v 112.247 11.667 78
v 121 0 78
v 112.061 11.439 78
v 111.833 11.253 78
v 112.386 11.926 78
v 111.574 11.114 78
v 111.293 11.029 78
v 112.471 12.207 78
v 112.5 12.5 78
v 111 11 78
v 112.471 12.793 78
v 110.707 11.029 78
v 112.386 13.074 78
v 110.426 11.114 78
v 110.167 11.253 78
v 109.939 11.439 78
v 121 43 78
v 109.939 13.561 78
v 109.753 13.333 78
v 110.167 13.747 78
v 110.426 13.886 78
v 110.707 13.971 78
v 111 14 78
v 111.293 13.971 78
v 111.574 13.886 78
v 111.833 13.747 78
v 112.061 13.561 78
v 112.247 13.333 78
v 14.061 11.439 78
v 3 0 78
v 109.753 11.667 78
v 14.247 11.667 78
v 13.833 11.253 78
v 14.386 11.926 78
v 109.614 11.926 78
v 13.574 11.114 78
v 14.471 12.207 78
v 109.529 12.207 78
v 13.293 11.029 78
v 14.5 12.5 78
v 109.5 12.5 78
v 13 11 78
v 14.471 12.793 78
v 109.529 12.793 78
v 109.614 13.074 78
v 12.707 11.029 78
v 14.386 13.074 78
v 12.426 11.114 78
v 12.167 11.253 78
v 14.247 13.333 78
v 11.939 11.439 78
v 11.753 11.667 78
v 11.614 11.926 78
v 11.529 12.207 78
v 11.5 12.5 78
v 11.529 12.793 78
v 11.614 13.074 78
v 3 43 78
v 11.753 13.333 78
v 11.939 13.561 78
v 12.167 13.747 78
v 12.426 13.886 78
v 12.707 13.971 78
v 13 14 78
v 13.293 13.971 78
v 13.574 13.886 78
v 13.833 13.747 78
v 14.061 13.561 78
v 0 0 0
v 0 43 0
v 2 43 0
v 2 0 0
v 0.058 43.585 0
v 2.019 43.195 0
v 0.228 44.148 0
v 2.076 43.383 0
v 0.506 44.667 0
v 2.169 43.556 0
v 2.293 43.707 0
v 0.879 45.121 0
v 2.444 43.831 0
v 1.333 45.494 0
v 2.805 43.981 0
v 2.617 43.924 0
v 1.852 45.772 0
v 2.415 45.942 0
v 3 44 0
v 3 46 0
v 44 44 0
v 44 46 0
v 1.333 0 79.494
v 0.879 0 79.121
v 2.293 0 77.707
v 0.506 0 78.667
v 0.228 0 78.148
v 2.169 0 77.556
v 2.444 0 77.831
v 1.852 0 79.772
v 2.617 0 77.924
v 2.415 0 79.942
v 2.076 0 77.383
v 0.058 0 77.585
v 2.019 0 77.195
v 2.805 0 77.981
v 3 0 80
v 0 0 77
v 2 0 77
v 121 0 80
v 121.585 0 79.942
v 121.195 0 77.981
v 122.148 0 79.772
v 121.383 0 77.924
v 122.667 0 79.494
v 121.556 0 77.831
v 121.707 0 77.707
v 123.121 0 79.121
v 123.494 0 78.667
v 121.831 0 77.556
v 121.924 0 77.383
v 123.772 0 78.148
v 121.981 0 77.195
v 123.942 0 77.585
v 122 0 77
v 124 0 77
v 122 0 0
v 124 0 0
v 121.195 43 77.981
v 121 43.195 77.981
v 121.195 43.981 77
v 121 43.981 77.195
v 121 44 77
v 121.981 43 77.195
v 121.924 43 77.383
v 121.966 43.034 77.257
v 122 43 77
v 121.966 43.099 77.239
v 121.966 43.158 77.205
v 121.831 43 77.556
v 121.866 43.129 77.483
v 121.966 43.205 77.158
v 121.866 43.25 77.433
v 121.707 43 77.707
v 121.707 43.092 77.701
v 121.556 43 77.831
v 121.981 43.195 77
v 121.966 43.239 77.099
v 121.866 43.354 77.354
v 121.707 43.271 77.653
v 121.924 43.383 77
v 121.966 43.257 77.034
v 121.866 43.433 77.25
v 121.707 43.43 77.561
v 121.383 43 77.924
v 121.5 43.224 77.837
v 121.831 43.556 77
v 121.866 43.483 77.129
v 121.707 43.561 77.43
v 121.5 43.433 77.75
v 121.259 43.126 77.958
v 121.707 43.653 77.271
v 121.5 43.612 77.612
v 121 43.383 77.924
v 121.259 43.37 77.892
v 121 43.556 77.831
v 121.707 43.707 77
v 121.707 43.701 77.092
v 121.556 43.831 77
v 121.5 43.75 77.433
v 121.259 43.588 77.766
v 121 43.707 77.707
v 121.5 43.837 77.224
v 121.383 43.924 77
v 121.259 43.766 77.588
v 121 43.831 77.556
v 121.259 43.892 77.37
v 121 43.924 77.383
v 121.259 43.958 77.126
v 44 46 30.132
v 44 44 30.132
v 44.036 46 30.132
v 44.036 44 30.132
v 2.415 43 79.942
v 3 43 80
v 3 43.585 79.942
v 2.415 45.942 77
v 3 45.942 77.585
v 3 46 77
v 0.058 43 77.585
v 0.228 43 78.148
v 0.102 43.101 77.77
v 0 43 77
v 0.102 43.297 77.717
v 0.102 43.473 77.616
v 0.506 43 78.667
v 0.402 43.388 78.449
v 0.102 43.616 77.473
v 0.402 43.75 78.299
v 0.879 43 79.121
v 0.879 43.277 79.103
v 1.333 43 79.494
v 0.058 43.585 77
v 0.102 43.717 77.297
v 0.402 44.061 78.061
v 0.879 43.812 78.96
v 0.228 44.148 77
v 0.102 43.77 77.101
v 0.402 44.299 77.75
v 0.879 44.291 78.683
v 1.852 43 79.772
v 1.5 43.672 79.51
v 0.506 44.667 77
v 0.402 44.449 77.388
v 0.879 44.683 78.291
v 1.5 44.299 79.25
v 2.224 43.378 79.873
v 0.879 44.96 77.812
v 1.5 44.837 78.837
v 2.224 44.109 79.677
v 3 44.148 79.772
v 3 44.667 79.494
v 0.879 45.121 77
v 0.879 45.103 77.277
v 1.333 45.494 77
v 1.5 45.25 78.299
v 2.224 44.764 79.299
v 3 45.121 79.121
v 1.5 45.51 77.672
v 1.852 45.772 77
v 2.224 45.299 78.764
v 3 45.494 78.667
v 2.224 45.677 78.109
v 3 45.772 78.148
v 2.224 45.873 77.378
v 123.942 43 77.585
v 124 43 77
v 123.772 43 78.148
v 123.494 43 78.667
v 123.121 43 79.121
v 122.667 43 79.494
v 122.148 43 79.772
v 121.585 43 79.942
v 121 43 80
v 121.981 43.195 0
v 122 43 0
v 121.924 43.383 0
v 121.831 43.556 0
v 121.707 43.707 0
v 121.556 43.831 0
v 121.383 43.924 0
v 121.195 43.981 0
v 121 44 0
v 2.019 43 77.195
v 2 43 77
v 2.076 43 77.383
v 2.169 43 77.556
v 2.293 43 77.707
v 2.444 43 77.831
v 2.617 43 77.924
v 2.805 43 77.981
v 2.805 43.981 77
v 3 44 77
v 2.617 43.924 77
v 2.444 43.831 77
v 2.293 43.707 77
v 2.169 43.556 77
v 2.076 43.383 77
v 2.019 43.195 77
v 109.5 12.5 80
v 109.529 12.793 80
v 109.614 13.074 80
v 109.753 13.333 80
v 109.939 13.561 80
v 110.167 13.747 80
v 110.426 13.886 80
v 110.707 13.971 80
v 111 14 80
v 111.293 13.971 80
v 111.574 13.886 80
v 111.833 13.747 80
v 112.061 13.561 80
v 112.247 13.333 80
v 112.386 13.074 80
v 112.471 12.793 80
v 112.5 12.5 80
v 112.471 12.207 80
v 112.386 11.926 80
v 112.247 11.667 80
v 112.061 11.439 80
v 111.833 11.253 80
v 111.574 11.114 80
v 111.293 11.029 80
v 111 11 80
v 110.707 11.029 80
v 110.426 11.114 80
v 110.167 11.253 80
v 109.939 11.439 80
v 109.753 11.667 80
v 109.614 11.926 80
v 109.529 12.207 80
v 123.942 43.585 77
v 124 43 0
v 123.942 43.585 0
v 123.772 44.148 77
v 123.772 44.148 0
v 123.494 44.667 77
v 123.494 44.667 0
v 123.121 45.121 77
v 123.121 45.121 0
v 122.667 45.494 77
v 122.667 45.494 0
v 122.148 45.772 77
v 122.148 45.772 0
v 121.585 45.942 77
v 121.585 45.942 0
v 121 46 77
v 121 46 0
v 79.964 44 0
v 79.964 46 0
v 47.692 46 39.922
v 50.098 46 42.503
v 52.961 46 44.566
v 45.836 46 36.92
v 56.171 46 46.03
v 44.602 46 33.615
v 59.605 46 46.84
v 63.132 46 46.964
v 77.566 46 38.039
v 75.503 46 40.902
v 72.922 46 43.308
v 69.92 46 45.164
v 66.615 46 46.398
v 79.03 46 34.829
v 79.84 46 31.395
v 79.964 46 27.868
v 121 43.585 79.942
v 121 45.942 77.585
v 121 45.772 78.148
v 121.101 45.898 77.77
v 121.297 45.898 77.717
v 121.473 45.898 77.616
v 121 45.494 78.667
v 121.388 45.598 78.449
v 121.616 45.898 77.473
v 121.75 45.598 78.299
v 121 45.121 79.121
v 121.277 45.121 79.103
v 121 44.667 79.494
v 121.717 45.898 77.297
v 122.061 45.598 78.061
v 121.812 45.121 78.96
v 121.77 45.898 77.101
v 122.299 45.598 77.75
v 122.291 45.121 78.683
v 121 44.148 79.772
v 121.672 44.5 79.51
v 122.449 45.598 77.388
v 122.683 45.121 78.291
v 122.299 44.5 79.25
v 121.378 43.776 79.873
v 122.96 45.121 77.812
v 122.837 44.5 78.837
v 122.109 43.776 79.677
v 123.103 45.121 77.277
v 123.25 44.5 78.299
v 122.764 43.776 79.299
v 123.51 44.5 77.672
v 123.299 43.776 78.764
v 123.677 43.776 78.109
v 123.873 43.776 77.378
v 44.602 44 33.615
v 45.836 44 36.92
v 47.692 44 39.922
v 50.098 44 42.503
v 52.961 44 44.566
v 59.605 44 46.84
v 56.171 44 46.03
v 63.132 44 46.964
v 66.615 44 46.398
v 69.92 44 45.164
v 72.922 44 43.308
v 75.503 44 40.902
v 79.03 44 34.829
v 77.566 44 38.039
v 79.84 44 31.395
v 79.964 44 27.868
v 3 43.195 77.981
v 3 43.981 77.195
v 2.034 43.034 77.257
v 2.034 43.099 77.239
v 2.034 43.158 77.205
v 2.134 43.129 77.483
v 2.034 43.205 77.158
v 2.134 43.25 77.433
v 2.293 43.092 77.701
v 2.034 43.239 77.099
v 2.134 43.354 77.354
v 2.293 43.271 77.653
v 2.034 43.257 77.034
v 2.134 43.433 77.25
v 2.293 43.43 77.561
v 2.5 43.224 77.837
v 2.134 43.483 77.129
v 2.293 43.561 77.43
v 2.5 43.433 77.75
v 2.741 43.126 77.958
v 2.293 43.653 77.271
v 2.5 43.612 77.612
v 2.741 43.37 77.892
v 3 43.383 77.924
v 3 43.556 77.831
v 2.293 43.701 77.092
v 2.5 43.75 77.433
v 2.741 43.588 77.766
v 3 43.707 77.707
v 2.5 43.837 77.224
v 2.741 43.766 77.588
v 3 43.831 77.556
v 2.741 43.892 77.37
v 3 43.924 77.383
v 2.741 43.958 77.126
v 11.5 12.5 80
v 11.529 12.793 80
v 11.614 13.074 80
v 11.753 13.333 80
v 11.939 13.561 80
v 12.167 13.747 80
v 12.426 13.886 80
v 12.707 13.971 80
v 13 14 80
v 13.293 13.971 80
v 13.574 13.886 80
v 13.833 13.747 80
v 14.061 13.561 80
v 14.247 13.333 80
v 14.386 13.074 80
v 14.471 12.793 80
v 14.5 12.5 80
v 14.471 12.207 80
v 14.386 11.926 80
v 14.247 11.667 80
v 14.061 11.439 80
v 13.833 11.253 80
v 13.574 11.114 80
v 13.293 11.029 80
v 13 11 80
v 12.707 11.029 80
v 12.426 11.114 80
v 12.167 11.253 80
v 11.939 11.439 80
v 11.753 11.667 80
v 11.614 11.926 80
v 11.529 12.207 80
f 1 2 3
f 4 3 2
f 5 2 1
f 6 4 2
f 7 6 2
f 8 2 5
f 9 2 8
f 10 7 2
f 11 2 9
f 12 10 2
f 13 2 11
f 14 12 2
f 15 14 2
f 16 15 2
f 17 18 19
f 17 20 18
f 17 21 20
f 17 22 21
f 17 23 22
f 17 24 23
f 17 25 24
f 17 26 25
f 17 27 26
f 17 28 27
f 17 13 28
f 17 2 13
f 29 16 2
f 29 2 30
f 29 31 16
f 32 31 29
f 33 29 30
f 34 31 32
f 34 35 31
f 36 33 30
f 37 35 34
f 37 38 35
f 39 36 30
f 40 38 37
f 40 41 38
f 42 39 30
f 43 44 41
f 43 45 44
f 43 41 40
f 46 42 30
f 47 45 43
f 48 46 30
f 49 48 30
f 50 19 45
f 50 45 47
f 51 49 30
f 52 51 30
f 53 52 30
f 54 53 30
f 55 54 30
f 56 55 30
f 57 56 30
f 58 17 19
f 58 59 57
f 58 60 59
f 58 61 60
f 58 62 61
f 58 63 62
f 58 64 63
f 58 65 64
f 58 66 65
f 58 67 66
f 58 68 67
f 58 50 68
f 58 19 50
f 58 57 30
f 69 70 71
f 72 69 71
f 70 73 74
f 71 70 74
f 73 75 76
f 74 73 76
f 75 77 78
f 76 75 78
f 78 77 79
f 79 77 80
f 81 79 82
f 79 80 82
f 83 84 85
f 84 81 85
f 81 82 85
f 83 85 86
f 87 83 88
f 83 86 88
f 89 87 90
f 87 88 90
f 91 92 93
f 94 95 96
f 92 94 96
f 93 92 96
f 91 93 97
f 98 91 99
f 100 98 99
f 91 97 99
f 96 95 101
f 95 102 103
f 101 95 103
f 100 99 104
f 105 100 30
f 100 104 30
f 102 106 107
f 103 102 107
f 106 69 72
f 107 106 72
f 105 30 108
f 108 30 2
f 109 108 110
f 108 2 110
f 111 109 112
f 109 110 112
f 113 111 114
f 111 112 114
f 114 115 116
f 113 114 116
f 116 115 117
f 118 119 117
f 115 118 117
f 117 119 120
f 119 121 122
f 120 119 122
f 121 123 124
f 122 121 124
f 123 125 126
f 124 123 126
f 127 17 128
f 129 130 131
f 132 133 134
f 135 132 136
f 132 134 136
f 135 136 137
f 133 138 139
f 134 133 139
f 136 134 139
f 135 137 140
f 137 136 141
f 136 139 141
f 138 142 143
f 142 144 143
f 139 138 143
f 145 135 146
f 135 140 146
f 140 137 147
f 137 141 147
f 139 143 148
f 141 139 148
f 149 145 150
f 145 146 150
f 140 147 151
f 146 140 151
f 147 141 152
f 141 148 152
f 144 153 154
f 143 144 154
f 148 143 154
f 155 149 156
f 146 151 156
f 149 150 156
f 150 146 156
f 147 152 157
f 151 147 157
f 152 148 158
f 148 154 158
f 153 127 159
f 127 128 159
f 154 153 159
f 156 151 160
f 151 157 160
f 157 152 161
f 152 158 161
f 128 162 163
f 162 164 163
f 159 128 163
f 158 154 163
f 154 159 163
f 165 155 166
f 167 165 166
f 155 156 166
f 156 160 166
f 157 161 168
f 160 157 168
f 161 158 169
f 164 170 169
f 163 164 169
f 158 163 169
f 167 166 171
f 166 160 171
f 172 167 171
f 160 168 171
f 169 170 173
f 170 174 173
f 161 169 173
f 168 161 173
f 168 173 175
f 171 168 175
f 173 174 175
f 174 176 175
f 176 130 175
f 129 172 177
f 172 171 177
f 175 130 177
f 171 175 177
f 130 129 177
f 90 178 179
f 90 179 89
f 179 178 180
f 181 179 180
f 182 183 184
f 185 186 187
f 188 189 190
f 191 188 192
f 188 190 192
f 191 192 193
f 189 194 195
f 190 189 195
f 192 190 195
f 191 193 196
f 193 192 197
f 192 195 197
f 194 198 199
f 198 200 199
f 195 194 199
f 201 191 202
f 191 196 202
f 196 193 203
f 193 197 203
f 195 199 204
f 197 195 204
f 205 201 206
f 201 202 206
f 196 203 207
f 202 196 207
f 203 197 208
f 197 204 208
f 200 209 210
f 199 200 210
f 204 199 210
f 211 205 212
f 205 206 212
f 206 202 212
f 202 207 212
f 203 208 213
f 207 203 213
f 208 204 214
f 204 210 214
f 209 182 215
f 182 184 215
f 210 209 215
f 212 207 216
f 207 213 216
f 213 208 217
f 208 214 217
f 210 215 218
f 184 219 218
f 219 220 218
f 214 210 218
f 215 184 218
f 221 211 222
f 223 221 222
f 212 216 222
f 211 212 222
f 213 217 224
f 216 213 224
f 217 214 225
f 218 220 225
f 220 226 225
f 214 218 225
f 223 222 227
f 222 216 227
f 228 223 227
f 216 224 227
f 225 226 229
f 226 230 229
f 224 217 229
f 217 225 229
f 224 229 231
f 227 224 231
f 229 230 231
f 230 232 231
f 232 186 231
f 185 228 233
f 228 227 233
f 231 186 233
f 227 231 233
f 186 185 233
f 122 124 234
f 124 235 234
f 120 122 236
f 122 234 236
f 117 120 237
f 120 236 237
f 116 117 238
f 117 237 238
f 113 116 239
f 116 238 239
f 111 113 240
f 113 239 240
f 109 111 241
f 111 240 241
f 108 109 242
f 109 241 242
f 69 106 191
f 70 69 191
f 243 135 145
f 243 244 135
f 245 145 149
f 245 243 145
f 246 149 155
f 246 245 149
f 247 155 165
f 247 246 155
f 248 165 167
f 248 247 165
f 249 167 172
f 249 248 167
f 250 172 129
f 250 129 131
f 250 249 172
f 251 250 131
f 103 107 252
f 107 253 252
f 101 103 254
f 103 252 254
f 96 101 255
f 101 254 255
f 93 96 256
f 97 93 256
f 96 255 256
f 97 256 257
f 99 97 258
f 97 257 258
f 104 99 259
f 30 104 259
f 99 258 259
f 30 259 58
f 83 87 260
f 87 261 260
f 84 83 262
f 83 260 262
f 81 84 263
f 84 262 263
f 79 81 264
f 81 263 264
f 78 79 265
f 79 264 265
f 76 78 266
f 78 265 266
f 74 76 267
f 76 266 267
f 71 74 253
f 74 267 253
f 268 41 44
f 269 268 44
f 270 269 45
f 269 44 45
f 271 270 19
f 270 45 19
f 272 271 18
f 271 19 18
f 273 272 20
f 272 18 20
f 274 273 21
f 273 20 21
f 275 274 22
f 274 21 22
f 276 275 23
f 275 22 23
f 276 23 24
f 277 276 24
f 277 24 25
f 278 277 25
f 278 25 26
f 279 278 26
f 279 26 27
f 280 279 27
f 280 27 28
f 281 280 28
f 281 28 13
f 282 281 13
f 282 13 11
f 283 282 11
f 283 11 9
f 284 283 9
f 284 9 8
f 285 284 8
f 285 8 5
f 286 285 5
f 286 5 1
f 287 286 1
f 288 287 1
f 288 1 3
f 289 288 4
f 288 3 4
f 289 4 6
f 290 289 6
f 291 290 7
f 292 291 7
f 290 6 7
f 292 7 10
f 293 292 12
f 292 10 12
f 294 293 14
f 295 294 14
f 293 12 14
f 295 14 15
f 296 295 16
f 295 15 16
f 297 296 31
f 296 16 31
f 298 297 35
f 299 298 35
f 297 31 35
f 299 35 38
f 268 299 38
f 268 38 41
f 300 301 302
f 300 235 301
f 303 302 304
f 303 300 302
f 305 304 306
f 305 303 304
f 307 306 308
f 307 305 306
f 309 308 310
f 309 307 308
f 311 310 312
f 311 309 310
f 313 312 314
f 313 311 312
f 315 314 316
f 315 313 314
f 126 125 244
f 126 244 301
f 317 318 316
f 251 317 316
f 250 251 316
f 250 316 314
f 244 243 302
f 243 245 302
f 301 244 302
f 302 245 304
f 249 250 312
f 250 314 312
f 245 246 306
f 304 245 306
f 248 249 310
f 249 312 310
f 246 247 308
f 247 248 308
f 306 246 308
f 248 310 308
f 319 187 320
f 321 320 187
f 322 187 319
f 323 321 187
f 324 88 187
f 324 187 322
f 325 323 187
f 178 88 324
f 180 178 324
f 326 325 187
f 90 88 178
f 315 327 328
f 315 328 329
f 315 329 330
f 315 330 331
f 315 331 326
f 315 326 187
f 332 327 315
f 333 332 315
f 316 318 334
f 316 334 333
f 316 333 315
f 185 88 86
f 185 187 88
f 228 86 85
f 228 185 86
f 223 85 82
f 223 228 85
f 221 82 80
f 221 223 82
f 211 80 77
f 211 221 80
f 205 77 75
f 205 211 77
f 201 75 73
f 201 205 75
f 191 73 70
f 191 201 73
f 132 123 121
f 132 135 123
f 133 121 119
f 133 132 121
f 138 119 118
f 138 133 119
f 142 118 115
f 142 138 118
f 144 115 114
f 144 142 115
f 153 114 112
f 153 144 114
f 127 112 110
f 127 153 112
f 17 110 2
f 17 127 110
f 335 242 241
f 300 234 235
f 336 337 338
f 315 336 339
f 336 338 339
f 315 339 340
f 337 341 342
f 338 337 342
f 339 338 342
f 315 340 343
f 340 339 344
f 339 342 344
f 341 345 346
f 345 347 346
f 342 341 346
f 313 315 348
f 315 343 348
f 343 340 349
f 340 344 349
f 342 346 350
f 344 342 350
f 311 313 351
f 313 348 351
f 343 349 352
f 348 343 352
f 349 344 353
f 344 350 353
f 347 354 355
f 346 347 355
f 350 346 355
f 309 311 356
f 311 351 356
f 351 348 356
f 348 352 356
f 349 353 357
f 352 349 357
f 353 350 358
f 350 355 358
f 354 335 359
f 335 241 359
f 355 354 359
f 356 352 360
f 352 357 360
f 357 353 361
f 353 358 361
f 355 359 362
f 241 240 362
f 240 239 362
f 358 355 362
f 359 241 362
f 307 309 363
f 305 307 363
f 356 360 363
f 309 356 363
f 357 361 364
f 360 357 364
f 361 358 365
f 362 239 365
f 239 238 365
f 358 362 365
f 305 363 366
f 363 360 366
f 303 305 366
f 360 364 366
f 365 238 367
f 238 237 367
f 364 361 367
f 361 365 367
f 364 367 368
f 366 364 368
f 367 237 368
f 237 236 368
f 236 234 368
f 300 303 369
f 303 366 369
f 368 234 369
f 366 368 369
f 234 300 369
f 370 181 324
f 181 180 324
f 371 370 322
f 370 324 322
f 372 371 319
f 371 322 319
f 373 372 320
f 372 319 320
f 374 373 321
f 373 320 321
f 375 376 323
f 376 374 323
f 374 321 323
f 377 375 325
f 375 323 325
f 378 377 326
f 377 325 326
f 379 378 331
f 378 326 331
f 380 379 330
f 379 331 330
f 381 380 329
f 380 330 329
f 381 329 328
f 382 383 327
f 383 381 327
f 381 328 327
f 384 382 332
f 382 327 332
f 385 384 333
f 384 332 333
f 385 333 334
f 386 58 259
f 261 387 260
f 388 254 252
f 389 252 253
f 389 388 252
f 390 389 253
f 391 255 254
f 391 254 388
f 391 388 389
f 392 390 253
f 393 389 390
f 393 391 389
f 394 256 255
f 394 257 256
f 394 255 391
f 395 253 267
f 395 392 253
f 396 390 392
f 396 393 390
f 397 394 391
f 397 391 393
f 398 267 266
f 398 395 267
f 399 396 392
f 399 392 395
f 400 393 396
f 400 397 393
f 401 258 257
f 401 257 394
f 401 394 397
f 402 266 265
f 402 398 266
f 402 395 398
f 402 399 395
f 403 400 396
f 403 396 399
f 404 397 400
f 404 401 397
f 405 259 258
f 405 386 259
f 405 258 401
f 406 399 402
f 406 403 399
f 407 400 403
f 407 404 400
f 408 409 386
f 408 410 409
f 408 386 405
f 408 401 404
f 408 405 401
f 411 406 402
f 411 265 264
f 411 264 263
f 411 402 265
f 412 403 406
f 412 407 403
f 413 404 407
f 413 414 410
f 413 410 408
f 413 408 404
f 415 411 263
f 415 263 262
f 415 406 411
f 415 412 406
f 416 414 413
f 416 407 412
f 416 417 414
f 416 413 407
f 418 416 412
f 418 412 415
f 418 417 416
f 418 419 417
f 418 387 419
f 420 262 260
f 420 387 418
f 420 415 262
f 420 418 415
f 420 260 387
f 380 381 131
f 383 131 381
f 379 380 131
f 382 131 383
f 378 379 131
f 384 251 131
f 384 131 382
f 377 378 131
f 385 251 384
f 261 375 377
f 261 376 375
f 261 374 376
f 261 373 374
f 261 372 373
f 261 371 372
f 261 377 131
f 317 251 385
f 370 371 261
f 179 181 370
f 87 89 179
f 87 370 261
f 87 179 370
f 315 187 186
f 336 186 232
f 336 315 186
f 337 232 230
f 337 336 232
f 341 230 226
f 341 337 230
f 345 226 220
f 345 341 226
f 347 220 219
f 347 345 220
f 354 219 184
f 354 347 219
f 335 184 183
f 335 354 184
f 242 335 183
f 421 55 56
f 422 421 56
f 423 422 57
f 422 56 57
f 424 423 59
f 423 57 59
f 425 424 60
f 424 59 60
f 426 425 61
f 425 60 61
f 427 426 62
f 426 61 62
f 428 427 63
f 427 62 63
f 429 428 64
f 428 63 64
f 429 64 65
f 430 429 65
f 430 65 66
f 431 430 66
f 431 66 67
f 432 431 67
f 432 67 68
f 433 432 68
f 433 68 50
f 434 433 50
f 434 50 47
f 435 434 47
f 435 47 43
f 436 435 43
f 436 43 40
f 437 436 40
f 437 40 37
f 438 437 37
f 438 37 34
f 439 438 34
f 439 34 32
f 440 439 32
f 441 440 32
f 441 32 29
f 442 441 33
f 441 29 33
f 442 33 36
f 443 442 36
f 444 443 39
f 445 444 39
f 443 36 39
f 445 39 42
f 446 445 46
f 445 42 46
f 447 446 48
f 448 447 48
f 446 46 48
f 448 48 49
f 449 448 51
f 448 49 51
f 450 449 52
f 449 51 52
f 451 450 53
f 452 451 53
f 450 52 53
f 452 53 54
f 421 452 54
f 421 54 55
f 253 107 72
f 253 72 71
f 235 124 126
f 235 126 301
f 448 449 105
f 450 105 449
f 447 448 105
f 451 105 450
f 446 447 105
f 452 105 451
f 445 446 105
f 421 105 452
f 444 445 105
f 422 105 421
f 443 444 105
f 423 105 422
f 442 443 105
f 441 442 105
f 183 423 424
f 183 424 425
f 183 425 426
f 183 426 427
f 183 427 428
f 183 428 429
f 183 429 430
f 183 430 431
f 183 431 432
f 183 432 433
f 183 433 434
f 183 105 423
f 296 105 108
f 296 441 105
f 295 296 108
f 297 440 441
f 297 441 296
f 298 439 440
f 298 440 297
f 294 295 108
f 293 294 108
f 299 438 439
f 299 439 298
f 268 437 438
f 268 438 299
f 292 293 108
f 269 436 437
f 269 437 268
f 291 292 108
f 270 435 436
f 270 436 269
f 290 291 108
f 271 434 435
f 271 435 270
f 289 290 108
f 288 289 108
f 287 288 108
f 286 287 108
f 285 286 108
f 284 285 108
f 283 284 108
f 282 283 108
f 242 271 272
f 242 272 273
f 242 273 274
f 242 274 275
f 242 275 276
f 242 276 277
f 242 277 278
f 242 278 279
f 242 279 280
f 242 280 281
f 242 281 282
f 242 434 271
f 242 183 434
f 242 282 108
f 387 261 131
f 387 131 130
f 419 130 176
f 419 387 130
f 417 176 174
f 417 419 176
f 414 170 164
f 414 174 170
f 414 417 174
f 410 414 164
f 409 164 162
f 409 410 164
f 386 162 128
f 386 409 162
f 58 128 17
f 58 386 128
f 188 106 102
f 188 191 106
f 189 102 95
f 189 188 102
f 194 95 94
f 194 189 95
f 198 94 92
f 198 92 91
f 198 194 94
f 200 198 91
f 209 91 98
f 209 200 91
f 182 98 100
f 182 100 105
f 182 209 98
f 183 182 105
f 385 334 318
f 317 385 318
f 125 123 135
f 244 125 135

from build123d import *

# Parameters (mm, degrees)
SKETCH1_W             = 124
SKETCH1_H             = 46
BOSS_EXTRUDE1_DEPTH   = 80
SKETCH2_W             = 120
SKETCH2_H             = 44
CUT_EXTRUDE1_DEPTH    = 78
SKETCH3_R             = 18
CUT_EXTRUDE2_DEPTH    = 78
SKETCH4_W             = 35.964383321
SKETCH4_H             = 30.131782619
CUT_EXTRUDE3_DEPTH    = 78
FILLET1_R             = 1
FILLET2_R             = 1
FILLET3_R             = 3
F_3_0MM_DOWEL_HOLE1_D = 3


with BuildPart() as part:
    # Sketch1 → Boss-Extrude1 (new body)
    with BuildSketch(Plane.XY):
        with Locations((62, 23)):
            Rectangle(SKETCH1_W, SKETCH1_H)
    extrude(amount=BOSS_EXTRUDE1_DEPTH)

    # Sketch2 → Cut-Extrude1 (cut)
    with BuildSketch(Plane(origin=(0, 0, 0), x_dir=(-1, 0, 0), z_dir=(0, 0, -1))):
        with Locations((-62, 22)):
            Rectangle(SKETCH2_W, SKETCH2_H)
    extrude(amount=-CUT_EXTRUDE1_DEPTH, mode=Mode.SUBTRACT)

    # Sketch3 → Cut-Extrude2 (cut)
    with BuildSketch(Plane(origin=(0, 46, 0), x_dir=(1, 0, 0), z_dir=(0, 1, 0))):
        with Locations(Location((62, -29, 0), (0, 0, 270))):
            Circle(SKETCH3_R)
    extrude(amount=-CUT_EXTRUDE2_DEPTH, mode=Mode.SUBTRACT)

    # Sketch4 → Cut-Extrude3 (cut)
    with BuildSketch(Plane(origin=(0, 46, 0), x_dir=(1, 0, 0), z_dir=(0, 1, 0))):
        with Locations((61.98219166, -15.06589131)):
            Rectangle(SKETCH4_W, SKETCH4_H)
    extrude(amount=-CUT_EXTRUDE3_DEPTH, mode=Mode.SUBTRACT)

    # Fillet1
    fillet1_edges = [part.edges().sort_by_distance(p)[0] for p in [
        (62, 44, 78),
        (2, 22, 78),
        (2, 44, 39),
    ]]
    fillet(fillet1_edges, radius=FILLET1_R)

    # Fillet2
    fillet2_edges = [part.edges().sort_by_distance(p)[0] for p in [
        (122, 21.5, 78),
        (122, 44, 38.5),
        (122, 43.707106781, 77.707106781),
    ]]
    fillet(fillet2_edges, radius=FILLET2_R)

    # Fillet3
    fillet3_edges = [part.edges().sort_by_distance(p)[0] for p in [
        (124, 23, 80),
        (62, 46, 80),
        (0, 23, 80),
        (0, 46, 40),
        (124, 46, 40),
    ]]
    fillet(fillet3_edges, radius=FILLET3_R)

    # Ø3.0mm Dowel Hole1 (through all)
    with Locations(Plane(origin=(13, 12.5, 80), x_dir=(1, 0, 0), z_dir=(0, 0, 1))):
        with Locations((0, 0), (98, 0)):
            Hole(F_3_0MM_DOWEL_HOLE1_D / 2)


solid = part.part
